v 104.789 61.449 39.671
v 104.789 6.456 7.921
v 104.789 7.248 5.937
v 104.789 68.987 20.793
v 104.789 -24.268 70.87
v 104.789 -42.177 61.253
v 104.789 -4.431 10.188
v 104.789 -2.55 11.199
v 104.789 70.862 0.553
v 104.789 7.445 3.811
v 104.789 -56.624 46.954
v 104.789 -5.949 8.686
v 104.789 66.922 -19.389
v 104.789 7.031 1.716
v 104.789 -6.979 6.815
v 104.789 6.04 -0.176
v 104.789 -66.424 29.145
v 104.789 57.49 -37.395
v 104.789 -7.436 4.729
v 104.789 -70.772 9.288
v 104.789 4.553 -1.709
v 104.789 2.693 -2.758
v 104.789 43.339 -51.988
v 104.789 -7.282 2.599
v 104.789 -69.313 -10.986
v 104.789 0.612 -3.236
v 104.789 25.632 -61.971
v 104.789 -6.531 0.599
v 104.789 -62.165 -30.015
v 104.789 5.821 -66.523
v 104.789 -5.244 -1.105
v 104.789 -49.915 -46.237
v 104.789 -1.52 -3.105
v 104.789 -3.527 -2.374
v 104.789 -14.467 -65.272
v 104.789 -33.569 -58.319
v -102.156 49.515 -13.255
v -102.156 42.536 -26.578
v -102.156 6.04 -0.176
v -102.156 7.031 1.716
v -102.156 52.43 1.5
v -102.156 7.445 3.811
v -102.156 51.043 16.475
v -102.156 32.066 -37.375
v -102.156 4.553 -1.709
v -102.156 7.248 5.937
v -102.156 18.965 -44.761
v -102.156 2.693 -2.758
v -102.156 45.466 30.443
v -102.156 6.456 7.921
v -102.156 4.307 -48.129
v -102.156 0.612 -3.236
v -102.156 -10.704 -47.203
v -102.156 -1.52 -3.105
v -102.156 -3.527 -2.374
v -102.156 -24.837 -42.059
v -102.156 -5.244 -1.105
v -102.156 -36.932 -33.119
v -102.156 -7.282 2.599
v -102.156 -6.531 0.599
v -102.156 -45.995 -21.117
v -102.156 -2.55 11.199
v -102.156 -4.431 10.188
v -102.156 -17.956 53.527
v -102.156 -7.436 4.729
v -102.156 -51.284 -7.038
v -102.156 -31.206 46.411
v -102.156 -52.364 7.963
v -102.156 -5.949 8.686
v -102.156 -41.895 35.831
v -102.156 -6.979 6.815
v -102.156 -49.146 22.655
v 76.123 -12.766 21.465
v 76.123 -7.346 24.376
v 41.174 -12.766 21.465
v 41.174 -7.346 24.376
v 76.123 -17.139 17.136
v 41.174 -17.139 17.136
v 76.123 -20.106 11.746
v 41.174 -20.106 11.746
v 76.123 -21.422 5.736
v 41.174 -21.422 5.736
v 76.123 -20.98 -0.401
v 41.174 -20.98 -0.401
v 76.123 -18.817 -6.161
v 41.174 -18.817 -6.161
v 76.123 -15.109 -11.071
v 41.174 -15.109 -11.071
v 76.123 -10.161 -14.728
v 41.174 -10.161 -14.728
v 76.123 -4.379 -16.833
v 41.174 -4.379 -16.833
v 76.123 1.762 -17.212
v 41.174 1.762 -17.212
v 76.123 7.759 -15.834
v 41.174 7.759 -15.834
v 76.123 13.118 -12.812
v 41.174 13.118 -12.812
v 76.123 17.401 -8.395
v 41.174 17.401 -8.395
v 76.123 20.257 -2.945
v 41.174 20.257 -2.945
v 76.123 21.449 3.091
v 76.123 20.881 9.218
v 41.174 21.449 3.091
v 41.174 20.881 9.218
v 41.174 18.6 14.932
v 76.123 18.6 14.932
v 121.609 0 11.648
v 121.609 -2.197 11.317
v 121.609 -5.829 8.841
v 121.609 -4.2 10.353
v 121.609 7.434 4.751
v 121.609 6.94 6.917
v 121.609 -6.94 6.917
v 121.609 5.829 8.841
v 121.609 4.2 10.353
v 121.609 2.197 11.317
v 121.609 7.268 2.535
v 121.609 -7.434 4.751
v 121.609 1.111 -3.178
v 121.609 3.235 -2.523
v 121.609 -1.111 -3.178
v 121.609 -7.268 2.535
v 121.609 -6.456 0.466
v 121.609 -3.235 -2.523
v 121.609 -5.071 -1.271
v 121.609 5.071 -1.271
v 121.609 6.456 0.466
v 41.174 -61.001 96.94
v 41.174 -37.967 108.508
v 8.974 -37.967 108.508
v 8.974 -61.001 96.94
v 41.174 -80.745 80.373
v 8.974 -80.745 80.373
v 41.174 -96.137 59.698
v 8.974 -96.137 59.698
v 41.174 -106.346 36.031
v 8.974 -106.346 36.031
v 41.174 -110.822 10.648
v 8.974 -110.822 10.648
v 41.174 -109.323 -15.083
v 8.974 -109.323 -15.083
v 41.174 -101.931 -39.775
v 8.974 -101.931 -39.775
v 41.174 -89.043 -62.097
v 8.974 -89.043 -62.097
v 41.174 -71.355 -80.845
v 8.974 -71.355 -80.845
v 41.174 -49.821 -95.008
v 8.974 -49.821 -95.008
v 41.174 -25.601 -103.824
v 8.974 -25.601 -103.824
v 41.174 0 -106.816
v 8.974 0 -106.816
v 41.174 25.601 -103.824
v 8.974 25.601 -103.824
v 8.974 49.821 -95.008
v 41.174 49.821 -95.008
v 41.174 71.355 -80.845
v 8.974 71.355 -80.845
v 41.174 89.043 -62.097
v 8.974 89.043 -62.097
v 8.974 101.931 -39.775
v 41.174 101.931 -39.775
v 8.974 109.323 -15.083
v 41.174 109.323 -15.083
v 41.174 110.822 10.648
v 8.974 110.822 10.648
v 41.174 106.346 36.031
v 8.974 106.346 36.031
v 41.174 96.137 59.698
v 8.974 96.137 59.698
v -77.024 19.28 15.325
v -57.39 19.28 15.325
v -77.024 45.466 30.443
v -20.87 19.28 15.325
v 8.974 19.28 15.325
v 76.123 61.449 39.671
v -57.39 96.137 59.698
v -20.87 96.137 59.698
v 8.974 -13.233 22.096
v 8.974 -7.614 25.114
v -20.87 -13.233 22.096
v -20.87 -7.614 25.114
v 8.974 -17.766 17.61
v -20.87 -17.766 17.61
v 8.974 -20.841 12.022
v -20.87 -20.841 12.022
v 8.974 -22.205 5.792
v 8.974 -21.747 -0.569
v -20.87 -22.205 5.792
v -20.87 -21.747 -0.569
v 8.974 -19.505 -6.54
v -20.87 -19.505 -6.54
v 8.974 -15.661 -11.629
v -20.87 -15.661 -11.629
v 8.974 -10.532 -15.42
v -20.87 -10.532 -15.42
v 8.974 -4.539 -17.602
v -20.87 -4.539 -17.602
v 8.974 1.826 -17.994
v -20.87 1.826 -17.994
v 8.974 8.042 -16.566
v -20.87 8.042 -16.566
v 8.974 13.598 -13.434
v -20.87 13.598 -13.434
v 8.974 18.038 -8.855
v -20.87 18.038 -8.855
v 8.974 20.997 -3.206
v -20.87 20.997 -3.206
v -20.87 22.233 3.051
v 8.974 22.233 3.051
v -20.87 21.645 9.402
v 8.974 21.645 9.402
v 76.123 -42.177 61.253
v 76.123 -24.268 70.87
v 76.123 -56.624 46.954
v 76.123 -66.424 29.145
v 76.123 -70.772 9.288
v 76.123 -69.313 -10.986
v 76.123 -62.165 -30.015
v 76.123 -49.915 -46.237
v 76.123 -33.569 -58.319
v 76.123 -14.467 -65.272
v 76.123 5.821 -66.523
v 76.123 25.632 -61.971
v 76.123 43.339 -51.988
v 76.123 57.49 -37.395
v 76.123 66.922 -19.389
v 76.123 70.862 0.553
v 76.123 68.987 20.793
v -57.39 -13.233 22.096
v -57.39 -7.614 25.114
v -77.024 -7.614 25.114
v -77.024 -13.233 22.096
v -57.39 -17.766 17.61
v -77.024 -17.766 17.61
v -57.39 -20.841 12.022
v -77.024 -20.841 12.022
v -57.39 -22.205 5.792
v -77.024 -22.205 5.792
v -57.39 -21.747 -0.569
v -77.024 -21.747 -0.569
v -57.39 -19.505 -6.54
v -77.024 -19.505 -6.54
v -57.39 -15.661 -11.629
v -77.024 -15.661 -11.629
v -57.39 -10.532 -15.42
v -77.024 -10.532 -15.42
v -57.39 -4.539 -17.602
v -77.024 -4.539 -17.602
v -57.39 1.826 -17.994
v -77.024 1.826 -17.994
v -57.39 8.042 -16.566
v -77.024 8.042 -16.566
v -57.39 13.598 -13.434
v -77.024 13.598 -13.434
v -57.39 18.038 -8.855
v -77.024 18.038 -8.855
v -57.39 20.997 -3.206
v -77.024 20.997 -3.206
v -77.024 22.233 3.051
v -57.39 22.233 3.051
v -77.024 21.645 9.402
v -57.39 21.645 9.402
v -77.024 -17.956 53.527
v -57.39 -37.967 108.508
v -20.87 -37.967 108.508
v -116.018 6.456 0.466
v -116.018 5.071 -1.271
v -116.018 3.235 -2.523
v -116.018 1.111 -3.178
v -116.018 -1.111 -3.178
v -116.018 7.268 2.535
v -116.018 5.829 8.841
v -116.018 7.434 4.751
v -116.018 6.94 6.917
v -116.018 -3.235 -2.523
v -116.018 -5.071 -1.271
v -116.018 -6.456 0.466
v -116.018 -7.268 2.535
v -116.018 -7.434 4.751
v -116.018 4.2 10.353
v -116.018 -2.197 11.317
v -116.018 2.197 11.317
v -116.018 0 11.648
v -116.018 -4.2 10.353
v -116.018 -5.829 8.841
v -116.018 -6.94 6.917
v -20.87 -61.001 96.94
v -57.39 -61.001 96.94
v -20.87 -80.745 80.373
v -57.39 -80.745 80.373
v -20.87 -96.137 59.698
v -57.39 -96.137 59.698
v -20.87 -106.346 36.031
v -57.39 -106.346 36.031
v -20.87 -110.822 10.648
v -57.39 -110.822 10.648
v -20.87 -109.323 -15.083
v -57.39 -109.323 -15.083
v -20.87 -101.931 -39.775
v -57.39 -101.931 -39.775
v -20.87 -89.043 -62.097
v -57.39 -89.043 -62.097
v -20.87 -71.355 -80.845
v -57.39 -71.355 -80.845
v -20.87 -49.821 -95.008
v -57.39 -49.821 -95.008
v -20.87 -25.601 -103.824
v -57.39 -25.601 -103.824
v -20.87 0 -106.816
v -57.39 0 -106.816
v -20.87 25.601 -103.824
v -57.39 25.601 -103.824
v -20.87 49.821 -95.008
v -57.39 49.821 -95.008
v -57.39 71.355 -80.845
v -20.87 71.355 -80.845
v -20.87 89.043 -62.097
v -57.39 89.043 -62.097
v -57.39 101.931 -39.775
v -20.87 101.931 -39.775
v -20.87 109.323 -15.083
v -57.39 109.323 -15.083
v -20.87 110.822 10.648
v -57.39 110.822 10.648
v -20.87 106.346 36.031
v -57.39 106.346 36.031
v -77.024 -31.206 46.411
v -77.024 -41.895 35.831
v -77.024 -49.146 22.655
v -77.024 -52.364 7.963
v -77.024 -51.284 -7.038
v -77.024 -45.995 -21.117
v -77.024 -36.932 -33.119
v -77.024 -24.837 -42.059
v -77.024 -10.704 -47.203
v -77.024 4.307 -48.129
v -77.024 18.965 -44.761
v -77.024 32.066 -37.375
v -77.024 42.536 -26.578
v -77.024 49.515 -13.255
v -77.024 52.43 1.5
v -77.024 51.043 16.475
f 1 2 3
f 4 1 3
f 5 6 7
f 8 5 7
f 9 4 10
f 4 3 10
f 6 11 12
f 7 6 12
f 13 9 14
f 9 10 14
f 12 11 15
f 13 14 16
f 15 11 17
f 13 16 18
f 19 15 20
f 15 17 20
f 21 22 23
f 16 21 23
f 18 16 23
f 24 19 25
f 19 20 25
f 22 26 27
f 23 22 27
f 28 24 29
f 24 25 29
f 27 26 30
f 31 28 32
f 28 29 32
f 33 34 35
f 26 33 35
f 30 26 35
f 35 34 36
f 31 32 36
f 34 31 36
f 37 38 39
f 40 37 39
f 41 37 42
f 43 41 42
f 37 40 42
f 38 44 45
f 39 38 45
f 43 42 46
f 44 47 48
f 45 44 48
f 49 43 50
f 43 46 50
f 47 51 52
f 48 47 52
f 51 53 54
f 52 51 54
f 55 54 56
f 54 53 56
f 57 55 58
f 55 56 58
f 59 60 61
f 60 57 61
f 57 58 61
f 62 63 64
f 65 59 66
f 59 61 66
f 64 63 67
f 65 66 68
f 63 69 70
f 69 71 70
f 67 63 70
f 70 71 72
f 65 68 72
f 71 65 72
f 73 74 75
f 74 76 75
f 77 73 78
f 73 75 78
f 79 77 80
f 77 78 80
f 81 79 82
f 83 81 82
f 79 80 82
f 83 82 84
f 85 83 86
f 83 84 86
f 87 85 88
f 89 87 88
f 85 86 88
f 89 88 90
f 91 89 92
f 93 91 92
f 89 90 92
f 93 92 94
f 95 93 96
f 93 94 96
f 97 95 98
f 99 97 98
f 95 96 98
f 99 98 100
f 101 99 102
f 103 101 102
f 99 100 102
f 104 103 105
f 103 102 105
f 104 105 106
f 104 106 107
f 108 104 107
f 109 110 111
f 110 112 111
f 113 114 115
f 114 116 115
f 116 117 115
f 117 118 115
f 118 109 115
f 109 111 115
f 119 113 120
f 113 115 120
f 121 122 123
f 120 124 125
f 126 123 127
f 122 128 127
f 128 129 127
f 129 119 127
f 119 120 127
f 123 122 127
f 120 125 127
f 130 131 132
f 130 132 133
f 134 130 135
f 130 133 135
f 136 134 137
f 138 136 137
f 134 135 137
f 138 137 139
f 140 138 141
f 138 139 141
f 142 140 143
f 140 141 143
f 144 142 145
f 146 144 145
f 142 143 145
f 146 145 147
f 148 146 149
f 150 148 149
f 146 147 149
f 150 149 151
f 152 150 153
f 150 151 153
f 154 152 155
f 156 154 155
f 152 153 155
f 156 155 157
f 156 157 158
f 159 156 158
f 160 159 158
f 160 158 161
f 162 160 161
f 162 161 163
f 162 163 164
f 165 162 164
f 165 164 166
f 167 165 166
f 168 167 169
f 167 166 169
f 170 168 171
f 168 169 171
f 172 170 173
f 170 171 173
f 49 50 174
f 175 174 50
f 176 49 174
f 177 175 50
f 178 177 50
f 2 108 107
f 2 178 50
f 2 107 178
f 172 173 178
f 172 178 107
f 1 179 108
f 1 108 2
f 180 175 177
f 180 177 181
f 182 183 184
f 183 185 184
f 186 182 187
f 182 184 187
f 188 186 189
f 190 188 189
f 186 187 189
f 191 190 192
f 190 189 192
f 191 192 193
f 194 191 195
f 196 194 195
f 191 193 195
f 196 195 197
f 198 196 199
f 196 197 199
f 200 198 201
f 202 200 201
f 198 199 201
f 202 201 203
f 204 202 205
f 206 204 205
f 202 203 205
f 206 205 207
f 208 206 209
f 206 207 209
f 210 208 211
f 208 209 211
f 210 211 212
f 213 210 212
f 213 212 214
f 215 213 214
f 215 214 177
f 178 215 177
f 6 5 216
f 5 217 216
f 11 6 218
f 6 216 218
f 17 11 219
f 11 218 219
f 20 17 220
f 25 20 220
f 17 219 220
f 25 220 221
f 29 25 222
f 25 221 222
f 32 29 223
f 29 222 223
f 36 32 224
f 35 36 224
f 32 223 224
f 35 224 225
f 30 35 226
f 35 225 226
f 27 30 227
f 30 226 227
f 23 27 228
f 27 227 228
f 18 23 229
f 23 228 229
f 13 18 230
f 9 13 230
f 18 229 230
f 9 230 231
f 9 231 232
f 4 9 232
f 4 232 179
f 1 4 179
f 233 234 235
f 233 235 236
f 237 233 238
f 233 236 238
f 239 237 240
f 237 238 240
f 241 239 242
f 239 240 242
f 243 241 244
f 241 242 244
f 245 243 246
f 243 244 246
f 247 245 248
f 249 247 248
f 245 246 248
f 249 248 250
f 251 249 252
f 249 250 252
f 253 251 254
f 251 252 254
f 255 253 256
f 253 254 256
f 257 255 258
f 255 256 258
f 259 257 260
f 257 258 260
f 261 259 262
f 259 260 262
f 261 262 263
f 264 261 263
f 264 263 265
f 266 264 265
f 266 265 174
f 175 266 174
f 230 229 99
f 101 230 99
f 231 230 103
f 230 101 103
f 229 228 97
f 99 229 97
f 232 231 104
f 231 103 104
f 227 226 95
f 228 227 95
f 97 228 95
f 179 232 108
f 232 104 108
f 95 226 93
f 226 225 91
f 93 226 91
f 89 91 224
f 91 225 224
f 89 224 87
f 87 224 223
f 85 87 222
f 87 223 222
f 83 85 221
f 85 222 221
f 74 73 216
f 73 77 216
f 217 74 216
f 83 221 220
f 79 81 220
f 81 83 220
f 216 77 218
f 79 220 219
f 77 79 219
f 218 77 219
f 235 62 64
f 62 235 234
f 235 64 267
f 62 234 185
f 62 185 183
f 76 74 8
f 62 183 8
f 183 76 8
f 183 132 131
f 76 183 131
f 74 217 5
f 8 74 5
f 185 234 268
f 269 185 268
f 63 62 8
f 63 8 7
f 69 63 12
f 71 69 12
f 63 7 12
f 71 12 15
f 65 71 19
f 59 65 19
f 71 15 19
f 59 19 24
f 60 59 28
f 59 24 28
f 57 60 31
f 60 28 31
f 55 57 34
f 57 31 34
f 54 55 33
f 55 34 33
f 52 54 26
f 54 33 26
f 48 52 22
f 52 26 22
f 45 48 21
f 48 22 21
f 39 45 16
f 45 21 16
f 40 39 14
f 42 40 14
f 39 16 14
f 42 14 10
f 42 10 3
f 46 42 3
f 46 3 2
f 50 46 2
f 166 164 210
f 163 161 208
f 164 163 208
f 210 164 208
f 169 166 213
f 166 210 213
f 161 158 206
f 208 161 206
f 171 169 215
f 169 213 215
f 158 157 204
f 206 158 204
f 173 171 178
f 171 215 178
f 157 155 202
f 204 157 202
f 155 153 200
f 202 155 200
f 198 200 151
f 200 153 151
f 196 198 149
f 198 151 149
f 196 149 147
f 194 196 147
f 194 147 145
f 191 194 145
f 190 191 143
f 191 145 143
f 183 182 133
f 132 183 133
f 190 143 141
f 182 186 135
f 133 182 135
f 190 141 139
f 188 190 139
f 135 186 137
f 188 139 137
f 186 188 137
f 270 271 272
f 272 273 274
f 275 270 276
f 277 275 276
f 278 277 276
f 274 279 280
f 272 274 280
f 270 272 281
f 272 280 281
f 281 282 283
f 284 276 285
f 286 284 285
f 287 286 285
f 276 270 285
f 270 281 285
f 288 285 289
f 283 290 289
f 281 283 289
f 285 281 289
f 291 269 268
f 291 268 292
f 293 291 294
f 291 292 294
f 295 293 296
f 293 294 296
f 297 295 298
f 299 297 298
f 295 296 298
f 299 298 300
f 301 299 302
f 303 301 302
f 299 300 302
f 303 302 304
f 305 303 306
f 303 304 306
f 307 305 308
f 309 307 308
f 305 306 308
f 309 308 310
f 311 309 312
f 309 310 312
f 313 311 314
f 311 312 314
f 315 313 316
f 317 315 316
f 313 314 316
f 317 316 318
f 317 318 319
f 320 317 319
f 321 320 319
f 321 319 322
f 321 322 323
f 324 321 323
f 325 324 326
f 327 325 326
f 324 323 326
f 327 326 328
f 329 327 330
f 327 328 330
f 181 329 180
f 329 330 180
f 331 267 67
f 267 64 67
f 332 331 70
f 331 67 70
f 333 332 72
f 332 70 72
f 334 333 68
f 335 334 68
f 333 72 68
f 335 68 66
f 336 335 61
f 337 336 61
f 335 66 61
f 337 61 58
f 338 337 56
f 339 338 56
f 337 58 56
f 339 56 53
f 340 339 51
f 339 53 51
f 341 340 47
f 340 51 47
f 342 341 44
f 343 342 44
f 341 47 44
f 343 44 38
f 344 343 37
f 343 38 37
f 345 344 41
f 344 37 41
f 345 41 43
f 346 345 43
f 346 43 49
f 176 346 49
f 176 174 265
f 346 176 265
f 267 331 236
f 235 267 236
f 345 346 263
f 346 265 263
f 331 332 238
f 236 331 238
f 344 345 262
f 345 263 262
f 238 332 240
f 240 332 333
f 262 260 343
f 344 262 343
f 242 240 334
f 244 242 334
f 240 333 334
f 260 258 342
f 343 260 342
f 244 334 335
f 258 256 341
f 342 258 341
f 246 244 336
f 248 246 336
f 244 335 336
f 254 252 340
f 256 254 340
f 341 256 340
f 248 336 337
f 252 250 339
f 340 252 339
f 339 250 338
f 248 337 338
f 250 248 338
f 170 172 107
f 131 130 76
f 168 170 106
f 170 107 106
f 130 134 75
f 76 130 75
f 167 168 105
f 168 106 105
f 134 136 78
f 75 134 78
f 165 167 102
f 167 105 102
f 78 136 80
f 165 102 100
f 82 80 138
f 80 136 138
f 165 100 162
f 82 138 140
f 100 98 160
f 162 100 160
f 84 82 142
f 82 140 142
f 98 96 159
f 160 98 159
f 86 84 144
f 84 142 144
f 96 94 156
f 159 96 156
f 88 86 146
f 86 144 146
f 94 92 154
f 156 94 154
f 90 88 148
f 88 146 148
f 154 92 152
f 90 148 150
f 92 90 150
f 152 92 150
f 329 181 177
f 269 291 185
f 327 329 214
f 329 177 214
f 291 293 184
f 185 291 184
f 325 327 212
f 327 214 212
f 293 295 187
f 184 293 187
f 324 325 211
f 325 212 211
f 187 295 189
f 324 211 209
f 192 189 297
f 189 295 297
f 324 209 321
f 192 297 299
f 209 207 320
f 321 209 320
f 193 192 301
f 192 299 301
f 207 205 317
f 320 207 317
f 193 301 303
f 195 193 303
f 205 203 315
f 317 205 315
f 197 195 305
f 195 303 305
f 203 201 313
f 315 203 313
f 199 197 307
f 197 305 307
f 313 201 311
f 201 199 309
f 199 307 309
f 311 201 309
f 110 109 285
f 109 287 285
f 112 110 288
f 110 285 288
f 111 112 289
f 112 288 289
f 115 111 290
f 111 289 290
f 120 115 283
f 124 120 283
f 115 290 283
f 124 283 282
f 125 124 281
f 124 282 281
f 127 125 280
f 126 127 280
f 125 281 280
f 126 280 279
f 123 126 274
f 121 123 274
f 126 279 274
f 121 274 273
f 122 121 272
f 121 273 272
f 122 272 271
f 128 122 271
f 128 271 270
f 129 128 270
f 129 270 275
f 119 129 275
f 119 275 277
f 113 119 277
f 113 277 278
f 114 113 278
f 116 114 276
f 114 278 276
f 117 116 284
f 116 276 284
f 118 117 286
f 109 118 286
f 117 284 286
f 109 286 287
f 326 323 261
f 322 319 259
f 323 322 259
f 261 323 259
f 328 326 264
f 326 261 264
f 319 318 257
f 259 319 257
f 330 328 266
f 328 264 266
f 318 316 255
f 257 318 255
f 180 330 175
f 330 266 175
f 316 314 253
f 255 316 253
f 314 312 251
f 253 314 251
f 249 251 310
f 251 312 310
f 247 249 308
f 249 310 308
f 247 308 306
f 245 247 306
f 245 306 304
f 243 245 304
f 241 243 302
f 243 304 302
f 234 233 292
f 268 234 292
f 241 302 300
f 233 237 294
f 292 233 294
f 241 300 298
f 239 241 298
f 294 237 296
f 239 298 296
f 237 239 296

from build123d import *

# Parameters (mm, degrees)
F2_ANGLE_START = 20
F2_ANGLE       = 280


with BuildPart() as f1:
    # F0 (on Front) → F1 (revolve)
    with BuildSketch(Plane.XZ):
        Polygon((-102.1556183696, 11.6483550519), (-116.0176545382, 11.6483550519), (-116.0176545382, 4.1934056208), (121.6088682413, 4.1934056208), (121.6088682413, 11.6483550519), (104.7888696194, 11.6483550519), align=None)
    revolve(axis=Axis((2.7956068516, 0, 4.1934056208), (1, 0, 0)))


with BuildPart() as f2:
    # F0 (on Front) → F2 (revolve)
    with BuildSketch(Plane.XZ, mode=Mode.PRIVATE) as f2_sk:
        Polygon((-102.1556183696, 56.6928498447), (-102.1556183696, 11.6483550519), (104.7888696194, 11.6483550519), (104.7888696194, 75.148999691), (76.1229395866, 75.148999691), (76.1229395866, 25.6708096713), (41.1740578711, 25.6708096713), (41.1740578711, 115.2027696371), (8.973967284, 115.2027696371), (8.973967284, 26.4561772346), (-20.8700187504, 26.4561772346), (-20.8700187504, 115.2027696371), (-57.3896355927, 115.2027696371), (-57.3896355927, 26.4561772346), (-77.0238339901, 26.4561772346), (-77.0238339901, 56.6928498447), align=None)
    revolve(f2_sk.sketch.rotate(Axis((-102.1556183696, 0, 4.1934056208), (1, 0, 0)), F2_ANGLE_START), axis=Axis((-102.1556183696, 0, 4.1934056208), (1, 0, 0)), revolution_arc=F2_ANGLE)


solid = Compound([f1.part, f2.part])
